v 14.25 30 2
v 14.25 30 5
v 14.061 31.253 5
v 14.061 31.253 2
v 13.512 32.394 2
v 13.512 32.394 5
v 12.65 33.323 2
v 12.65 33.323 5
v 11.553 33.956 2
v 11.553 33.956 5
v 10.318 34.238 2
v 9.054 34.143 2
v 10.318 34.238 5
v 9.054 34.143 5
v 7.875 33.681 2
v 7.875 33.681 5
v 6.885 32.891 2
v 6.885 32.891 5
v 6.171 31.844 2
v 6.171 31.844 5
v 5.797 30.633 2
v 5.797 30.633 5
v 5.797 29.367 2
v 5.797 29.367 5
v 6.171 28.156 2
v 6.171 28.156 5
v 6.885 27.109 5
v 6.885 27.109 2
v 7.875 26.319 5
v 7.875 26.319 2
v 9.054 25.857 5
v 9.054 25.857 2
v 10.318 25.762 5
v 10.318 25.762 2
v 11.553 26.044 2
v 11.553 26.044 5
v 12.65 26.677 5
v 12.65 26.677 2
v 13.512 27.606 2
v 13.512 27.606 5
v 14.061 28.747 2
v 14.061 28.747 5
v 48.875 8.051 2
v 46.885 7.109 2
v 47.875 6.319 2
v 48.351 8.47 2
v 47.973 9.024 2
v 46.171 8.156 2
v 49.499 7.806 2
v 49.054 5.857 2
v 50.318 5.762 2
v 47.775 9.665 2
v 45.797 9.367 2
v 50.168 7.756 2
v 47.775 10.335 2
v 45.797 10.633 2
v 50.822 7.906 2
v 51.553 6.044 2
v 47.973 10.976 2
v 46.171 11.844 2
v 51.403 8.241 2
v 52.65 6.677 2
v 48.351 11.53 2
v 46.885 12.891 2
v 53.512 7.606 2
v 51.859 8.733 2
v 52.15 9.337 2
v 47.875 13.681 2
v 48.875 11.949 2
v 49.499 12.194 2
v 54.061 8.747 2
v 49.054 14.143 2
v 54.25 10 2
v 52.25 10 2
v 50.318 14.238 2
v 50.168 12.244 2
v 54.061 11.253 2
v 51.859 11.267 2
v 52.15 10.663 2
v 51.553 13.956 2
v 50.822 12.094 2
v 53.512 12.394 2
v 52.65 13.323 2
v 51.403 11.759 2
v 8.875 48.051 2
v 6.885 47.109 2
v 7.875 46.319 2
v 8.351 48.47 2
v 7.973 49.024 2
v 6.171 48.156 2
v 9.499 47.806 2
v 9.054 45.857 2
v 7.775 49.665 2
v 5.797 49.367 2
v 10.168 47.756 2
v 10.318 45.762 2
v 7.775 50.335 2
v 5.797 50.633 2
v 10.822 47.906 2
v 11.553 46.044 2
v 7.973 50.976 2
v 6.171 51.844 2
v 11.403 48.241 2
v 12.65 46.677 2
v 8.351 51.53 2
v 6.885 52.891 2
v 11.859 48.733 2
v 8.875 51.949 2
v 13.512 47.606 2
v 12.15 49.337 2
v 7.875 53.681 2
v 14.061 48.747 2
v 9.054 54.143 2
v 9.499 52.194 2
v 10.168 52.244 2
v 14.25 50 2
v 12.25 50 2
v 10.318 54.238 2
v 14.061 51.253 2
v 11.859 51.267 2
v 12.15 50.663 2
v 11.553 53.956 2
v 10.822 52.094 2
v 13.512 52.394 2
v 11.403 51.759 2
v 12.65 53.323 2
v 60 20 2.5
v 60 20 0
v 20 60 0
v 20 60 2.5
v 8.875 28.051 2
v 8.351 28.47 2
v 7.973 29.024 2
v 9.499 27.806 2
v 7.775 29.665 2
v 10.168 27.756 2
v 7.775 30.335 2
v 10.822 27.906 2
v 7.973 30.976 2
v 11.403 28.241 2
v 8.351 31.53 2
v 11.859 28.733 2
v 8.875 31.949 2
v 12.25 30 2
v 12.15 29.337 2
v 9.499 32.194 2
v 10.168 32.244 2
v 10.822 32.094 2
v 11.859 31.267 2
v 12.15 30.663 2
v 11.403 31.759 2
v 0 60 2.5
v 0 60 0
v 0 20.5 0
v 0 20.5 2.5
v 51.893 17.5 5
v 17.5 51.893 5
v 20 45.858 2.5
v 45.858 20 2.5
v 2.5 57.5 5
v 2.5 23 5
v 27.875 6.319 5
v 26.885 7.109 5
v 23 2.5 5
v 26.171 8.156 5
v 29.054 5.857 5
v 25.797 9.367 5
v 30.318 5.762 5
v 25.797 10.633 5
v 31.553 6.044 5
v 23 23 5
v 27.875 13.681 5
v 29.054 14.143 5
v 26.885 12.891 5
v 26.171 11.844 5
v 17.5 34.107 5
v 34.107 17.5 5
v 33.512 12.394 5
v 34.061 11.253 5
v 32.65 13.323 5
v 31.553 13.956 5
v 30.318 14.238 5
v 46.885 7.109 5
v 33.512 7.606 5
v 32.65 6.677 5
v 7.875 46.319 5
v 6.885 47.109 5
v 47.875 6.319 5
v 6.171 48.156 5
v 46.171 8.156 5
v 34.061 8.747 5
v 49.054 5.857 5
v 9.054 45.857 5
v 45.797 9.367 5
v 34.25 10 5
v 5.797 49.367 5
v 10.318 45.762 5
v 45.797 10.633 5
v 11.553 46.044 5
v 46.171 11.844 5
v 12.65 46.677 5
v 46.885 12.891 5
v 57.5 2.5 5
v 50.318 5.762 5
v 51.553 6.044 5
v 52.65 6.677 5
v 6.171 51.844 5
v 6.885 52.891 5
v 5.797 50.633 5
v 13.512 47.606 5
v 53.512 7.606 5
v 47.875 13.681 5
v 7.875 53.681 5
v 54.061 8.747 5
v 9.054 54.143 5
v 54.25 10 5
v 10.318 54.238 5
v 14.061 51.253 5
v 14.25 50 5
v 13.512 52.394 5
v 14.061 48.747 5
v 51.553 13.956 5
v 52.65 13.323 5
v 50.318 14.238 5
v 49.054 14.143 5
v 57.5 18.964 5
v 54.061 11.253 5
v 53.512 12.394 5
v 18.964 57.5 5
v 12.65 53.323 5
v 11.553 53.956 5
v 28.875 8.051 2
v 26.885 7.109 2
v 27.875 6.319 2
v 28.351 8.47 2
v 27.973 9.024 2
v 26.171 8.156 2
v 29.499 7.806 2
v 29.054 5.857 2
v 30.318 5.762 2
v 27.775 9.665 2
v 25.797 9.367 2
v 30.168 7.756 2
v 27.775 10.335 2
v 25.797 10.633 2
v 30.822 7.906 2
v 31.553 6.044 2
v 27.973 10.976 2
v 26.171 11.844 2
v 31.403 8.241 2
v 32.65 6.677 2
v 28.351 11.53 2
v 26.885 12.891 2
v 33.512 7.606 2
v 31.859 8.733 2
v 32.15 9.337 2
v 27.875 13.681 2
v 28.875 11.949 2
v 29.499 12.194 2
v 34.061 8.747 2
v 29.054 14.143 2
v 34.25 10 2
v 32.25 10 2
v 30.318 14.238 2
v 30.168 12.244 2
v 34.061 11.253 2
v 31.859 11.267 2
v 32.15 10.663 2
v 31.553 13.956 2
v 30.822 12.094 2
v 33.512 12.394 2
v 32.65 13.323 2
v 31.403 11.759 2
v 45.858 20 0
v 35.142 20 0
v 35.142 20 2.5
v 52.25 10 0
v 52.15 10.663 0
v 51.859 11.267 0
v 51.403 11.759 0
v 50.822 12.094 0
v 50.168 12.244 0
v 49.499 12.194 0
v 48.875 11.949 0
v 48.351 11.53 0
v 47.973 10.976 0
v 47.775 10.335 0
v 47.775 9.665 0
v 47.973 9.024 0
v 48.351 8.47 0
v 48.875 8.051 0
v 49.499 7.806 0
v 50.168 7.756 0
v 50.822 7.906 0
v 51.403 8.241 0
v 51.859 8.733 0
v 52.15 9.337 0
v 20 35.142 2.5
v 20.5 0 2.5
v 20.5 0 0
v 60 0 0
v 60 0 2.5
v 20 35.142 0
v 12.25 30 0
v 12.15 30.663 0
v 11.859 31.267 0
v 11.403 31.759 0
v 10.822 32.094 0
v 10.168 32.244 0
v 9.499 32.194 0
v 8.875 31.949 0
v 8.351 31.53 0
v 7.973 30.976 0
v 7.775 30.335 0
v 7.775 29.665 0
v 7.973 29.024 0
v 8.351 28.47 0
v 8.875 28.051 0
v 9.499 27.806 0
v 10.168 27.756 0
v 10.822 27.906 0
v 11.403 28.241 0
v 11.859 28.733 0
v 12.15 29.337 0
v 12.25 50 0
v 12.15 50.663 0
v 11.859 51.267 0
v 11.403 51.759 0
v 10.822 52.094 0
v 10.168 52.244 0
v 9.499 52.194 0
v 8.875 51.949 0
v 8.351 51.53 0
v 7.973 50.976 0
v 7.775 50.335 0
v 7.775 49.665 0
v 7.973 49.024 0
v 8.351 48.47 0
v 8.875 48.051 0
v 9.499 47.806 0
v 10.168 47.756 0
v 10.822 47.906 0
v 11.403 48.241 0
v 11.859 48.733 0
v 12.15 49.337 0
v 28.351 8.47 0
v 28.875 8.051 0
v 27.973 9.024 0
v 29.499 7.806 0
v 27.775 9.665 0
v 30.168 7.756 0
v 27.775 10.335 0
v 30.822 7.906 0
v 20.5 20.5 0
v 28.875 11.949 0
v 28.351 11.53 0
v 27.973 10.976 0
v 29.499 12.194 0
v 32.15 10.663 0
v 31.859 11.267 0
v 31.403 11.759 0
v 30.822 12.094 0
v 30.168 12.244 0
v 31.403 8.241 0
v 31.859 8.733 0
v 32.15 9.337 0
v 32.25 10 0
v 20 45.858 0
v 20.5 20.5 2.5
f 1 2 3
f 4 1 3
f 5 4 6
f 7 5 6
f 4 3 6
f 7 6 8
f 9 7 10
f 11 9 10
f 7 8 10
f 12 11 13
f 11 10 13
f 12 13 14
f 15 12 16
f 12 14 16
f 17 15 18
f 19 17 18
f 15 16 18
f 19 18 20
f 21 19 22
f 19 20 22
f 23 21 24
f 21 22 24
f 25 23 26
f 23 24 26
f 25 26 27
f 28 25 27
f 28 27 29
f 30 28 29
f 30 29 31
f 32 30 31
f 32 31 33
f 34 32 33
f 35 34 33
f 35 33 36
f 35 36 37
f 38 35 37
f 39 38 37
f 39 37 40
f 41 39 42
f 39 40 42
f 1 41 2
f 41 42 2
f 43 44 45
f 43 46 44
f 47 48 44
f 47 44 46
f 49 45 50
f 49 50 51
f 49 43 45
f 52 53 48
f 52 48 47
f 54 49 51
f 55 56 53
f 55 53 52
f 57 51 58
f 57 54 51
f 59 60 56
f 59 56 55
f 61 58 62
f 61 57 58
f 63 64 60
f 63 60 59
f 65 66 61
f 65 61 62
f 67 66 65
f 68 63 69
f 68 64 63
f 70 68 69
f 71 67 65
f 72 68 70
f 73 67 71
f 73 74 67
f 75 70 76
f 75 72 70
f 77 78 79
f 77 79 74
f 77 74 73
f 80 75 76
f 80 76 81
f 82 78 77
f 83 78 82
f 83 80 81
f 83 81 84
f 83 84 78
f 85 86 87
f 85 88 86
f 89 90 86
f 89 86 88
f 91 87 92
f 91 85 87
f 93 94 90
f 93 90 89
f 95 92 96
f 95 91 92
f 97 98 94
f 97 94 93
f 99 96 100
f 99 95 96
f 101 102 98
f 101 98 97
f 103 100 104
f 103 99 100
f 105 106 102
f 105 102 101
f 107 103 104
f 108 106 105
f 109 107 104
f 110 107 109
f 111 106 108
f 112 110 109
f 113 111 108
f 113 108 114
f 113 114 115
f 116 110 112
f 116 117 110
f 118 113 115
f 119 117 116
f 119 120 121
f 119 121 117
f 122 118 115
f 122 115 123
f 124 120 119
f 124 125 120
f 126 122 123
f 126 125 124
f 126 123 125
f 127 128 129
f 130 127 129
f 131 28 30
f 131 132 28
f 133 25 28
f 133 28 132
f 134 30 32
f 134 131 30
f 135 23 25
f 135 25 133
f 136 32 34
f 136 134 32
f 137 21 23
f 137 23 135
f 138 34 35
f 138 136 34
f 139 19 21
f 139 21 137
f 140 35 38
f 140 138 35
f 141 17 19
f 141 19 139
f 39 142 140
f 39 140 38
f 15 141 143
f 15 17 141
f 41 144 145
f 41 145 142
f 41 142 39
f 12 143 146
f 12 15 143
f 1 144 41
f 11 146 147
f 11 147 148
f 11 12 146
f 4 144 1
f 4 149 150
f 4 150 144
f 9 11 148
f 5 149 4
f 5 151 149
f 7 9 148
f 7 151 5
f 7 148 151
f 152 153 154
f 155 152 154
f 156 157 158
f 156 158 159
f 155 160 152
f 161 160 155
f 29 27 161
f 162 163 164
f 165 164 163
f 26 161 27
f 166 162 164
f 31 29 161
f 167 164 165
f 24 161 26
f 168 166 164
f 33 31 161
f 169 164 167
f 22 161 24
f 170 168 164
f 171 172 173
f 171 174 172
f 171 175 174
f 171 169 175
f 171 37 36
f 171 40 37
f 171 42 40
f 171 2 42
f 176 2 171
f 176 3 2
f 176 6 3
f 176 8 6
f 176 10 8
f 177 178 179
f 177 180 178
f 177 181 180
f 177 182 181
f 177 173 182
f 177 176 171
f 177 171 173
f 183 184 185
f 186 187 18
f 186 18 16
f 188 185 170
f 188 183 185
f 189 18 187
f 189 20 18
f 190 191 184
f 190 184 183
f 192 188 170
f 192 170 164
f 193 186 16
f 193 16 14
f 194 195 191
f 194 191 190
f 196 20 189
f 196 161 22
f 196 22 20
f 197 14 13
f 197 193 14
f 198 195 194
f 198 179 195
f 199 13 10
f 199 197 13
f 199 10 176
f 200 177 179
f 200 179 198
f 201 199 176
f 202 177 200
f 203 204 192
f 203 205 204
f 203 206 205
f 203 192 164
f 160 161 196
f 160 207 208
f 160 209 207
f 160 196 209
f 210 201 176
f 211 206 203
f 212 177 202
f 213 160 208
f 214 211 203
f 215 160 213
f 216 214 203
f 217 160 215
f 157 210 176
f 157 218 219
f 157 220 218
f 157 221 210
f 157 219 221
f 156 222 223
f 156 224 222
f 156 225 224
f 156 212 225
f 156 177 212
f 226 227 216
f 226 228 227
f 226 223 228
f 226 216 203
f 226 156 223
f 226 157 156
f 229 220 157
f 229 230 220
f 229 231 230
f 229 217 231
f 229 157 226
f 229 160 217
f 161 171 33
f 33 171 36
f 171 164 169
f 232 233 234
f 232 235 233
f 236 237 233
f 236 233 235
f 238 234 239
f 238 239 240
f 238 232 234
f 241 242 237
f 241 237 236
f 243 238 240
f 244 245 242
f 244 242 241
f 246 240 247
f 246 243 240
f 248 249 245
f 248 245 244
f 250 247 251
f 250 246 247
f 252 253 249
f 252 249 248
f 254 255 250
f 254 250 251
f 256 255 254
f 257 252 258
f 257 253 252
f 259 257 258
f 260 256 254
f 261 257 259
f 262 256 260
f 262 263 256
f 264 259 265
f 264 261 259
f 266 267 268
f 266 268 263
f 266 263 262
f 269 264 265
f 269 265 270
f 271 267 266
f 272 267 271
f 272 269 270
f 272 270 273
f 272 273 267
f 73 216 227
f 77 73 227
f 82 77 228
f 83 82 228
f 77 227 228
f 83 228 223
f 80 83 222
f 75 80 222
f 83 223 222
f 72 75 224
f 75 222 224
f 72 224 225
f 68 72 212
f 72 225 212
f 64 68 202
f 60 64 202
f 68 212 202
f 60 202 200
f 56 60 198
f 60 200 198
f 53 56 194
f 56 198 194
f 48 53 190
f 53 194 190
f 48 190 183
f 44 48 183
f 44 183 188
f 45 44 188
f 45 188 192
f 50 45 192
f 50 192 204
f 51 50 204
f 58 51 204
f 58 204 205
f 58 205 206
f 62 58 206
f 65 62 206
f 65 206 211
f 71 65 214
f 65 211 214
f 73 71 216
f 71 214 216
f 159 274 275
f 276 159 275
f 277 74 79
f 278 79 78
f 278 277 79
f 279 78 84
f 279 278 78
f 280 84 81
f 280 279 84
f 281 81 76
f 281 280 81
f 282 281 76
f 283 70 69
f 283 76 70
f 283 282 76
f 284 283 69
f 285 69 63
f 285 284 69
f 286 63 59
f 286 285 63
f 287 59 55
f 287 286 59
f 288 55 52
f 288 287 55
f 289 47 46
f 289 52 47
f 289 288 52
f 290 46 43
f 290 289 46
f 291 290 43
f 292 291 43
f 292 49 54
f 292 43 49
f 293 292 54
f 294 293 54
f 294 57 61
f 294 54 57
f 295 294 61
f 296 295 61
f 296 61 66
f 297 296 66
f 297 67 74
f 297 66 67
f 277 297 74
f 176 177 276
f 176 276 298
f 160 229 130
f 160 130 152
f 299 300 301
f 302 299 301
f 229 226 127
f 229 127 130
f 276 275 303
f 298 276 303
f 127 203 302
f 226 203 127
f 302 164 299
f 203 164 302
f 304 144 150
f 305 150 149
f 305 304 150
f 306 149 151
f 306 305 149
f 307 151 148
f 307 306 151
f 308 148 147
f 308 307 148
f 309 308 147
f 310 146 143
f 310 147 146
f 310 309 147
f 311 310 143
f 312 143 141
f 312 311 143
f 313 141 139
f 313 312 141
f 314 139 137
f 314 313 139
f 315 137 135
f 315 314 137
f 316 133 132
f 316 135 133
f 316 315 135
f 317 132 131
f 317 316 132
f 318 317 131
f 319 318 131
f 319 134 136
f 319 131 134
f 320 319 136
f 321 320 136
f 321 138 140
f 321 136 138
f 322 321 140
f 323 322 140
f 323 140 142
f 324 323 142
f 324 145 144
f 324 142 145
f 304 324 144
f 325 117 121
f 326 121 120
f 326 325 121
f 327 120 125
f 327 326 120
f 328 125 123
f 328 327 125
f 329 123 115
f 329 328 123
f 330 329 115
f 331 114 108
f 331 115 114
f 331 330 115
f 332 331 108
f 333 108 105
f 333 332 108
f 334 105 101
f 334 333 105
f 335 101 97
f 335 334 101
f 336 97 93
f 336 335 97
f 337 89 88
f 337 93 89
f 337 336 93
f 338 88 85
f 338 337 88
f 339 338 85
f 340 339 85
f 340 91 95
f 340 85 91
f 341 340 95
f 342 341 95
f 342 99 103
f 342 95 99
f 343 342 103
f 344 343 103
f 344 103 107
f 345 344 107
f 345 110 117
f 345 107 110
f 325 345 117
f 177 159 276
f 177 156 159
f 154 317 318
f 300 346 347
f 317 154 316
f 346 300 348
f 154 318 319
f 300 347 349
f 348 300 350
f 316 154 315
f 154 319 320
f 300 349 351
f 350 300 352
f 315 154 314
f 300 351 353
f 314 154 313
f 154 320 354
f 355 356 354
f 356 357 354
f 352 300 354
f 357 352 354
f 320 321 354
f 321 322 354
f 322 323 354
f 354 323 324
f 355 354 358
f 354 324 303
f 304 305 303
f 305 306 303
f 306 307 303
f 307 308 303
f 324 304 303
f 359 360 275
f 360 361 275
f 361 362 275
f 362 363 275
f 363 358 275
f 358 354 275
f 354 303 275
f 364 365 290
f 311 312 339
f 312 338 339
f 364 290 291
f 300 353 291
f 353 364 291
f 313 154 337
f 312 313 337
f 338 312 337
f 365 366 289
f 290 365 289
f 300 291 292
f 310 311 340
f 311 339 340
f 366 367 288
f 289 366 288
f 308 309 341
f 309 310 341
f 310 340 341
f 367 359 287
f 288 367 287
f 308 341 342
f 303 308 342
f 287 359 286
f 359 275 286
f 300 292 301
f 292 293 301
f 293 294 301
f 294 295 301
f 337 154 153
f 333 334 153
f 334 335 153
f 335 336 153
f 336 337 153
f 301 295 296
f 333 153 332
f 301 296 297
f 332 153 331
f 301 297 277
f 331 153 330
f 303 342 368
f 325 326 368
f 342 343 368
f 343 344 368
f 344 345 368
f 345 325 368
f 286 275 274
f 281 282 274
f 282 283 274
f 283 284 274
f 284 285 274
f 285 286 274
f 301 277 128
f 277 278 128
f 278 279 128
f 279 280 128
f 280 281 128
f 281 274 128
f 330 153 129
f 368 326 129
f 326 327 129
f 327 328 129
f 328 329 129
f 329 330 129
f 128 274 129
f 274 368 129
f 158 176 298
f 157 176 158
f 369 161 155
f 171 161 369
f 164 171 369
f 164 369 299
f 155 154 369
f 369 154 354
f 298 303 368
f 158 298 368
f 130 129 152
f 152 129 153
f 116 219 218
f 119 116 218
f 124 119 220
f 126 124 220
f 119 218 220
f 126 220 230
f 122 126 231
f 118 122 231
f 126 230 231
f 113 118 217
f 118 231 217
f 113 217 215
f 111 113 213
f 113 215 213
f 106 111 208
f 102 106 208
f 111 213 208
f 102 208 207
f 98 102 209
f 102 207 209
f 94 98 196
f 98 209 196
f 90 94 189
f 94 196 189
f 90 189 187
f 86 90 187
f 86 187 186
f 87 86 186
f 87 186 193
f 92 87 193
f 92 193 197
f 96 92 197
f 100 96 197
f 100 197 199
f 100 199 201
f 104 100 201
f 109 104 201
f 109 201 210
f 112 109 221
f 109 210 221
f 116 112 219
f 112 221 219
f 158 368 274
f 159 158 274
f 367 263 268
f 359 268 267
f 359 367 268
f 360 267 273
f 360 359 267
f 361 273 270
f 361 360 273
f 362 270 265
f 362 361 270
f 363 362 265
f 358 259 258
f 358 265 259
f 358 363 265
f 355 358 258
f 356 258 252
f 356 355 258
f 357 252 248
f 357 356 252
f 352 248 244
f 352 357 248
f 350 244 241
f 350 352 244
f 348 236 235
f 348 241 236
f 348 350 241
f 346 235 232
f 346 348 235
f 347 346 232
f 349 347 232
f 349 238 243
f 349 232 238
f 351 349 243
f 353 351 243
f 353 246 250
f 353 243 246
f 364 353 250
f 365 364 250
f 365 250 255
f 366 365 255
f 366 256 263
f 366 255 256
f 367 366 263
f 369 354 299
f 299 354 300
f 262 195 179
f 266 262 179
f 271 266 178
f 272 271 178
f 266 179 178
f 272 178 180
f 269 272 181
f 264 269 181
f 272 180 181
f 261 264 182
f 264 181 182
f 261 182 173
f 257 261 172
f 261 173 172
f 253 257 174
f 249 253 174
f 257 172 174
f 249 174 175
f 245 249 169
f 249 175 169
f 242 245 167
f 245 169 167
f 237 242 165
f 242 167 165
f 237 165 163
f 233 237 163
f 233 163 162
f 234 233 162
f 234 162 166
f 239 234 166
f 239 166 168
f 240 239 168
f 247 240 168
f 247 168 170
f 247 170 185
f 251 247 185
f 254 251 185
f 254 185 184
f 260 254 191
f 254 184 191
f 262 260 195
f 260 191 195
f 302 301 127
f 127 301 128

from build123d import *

# Parameters (mm, degrees)
F0_R     = 2.25
F1_DEPTH = 5
F2_SIZE  = 2.5
F3_R     = 4.25
F4_DEPTH = 3


with BuildPart() as f1:
    # F0 (on Top) → F1 (new body)
    with BuildSketch(Plane.XY):
        Polygon((0, 60), (0, 20.5), (20.5, 20.5), (20.5, 0), (60, 0), (60, 20), (20, 60), align=None)
        with Locations((10, 30)):
            Circle(F0_R, mode=Mode.SUBTRACT)
        with Locations((30, 10)):
            Circle(F0_R, mode=Mode.SUBTRACT)
        with Locations((50, 10)):
            Circle(F0_R, mode=Mode.SUBTRACT)
        with Locations((10, 50)):
            Circle(F0_R, mode=Mode.SUBTRACT)
        Polygon((20, 35.142136), (20, 45.857864), (45.857864, 20), (35.142136, 20), align=None, mode=Mode.SUBTRACT)
    extrude(amount=F1_DEPTH)

    # F2
    f2_edges = [f1.edges().sort_by_distance(p)[0] for p in [
        (10.25, 20.5, 5),
        (20.5, 10.25, 5),
        (40.25, 0, 5),
        (60, 10, 5),
        (40, 40, 5),
        (10, 60, 5),
        (0, 40.25, 5),
        (20, 40.5, 5),
        (32.928932, 32.928932, 5),
        (40.5, 20, 5),
        (27.571068, 27.571068, 5),
    ]]
    chamfer(f2_edges, length=F2_SIZE)

    # F3 (on face) → F4 (cut)
    with BuildSketch(Plane.XY.offset(5)):
        with Locations((10, 50)):
            Circle(F3_R)
        with Locations((10, 30)):
            Circle(F3_R)
        with Locations((30, 10)):
            Circle(F3_R)
        with Locations((50, 10)):
            Circle(F3_R)
    extrude(amount=-F4_DEPTH, mode=Mode.SUBTRACT)


solid = f1.part
